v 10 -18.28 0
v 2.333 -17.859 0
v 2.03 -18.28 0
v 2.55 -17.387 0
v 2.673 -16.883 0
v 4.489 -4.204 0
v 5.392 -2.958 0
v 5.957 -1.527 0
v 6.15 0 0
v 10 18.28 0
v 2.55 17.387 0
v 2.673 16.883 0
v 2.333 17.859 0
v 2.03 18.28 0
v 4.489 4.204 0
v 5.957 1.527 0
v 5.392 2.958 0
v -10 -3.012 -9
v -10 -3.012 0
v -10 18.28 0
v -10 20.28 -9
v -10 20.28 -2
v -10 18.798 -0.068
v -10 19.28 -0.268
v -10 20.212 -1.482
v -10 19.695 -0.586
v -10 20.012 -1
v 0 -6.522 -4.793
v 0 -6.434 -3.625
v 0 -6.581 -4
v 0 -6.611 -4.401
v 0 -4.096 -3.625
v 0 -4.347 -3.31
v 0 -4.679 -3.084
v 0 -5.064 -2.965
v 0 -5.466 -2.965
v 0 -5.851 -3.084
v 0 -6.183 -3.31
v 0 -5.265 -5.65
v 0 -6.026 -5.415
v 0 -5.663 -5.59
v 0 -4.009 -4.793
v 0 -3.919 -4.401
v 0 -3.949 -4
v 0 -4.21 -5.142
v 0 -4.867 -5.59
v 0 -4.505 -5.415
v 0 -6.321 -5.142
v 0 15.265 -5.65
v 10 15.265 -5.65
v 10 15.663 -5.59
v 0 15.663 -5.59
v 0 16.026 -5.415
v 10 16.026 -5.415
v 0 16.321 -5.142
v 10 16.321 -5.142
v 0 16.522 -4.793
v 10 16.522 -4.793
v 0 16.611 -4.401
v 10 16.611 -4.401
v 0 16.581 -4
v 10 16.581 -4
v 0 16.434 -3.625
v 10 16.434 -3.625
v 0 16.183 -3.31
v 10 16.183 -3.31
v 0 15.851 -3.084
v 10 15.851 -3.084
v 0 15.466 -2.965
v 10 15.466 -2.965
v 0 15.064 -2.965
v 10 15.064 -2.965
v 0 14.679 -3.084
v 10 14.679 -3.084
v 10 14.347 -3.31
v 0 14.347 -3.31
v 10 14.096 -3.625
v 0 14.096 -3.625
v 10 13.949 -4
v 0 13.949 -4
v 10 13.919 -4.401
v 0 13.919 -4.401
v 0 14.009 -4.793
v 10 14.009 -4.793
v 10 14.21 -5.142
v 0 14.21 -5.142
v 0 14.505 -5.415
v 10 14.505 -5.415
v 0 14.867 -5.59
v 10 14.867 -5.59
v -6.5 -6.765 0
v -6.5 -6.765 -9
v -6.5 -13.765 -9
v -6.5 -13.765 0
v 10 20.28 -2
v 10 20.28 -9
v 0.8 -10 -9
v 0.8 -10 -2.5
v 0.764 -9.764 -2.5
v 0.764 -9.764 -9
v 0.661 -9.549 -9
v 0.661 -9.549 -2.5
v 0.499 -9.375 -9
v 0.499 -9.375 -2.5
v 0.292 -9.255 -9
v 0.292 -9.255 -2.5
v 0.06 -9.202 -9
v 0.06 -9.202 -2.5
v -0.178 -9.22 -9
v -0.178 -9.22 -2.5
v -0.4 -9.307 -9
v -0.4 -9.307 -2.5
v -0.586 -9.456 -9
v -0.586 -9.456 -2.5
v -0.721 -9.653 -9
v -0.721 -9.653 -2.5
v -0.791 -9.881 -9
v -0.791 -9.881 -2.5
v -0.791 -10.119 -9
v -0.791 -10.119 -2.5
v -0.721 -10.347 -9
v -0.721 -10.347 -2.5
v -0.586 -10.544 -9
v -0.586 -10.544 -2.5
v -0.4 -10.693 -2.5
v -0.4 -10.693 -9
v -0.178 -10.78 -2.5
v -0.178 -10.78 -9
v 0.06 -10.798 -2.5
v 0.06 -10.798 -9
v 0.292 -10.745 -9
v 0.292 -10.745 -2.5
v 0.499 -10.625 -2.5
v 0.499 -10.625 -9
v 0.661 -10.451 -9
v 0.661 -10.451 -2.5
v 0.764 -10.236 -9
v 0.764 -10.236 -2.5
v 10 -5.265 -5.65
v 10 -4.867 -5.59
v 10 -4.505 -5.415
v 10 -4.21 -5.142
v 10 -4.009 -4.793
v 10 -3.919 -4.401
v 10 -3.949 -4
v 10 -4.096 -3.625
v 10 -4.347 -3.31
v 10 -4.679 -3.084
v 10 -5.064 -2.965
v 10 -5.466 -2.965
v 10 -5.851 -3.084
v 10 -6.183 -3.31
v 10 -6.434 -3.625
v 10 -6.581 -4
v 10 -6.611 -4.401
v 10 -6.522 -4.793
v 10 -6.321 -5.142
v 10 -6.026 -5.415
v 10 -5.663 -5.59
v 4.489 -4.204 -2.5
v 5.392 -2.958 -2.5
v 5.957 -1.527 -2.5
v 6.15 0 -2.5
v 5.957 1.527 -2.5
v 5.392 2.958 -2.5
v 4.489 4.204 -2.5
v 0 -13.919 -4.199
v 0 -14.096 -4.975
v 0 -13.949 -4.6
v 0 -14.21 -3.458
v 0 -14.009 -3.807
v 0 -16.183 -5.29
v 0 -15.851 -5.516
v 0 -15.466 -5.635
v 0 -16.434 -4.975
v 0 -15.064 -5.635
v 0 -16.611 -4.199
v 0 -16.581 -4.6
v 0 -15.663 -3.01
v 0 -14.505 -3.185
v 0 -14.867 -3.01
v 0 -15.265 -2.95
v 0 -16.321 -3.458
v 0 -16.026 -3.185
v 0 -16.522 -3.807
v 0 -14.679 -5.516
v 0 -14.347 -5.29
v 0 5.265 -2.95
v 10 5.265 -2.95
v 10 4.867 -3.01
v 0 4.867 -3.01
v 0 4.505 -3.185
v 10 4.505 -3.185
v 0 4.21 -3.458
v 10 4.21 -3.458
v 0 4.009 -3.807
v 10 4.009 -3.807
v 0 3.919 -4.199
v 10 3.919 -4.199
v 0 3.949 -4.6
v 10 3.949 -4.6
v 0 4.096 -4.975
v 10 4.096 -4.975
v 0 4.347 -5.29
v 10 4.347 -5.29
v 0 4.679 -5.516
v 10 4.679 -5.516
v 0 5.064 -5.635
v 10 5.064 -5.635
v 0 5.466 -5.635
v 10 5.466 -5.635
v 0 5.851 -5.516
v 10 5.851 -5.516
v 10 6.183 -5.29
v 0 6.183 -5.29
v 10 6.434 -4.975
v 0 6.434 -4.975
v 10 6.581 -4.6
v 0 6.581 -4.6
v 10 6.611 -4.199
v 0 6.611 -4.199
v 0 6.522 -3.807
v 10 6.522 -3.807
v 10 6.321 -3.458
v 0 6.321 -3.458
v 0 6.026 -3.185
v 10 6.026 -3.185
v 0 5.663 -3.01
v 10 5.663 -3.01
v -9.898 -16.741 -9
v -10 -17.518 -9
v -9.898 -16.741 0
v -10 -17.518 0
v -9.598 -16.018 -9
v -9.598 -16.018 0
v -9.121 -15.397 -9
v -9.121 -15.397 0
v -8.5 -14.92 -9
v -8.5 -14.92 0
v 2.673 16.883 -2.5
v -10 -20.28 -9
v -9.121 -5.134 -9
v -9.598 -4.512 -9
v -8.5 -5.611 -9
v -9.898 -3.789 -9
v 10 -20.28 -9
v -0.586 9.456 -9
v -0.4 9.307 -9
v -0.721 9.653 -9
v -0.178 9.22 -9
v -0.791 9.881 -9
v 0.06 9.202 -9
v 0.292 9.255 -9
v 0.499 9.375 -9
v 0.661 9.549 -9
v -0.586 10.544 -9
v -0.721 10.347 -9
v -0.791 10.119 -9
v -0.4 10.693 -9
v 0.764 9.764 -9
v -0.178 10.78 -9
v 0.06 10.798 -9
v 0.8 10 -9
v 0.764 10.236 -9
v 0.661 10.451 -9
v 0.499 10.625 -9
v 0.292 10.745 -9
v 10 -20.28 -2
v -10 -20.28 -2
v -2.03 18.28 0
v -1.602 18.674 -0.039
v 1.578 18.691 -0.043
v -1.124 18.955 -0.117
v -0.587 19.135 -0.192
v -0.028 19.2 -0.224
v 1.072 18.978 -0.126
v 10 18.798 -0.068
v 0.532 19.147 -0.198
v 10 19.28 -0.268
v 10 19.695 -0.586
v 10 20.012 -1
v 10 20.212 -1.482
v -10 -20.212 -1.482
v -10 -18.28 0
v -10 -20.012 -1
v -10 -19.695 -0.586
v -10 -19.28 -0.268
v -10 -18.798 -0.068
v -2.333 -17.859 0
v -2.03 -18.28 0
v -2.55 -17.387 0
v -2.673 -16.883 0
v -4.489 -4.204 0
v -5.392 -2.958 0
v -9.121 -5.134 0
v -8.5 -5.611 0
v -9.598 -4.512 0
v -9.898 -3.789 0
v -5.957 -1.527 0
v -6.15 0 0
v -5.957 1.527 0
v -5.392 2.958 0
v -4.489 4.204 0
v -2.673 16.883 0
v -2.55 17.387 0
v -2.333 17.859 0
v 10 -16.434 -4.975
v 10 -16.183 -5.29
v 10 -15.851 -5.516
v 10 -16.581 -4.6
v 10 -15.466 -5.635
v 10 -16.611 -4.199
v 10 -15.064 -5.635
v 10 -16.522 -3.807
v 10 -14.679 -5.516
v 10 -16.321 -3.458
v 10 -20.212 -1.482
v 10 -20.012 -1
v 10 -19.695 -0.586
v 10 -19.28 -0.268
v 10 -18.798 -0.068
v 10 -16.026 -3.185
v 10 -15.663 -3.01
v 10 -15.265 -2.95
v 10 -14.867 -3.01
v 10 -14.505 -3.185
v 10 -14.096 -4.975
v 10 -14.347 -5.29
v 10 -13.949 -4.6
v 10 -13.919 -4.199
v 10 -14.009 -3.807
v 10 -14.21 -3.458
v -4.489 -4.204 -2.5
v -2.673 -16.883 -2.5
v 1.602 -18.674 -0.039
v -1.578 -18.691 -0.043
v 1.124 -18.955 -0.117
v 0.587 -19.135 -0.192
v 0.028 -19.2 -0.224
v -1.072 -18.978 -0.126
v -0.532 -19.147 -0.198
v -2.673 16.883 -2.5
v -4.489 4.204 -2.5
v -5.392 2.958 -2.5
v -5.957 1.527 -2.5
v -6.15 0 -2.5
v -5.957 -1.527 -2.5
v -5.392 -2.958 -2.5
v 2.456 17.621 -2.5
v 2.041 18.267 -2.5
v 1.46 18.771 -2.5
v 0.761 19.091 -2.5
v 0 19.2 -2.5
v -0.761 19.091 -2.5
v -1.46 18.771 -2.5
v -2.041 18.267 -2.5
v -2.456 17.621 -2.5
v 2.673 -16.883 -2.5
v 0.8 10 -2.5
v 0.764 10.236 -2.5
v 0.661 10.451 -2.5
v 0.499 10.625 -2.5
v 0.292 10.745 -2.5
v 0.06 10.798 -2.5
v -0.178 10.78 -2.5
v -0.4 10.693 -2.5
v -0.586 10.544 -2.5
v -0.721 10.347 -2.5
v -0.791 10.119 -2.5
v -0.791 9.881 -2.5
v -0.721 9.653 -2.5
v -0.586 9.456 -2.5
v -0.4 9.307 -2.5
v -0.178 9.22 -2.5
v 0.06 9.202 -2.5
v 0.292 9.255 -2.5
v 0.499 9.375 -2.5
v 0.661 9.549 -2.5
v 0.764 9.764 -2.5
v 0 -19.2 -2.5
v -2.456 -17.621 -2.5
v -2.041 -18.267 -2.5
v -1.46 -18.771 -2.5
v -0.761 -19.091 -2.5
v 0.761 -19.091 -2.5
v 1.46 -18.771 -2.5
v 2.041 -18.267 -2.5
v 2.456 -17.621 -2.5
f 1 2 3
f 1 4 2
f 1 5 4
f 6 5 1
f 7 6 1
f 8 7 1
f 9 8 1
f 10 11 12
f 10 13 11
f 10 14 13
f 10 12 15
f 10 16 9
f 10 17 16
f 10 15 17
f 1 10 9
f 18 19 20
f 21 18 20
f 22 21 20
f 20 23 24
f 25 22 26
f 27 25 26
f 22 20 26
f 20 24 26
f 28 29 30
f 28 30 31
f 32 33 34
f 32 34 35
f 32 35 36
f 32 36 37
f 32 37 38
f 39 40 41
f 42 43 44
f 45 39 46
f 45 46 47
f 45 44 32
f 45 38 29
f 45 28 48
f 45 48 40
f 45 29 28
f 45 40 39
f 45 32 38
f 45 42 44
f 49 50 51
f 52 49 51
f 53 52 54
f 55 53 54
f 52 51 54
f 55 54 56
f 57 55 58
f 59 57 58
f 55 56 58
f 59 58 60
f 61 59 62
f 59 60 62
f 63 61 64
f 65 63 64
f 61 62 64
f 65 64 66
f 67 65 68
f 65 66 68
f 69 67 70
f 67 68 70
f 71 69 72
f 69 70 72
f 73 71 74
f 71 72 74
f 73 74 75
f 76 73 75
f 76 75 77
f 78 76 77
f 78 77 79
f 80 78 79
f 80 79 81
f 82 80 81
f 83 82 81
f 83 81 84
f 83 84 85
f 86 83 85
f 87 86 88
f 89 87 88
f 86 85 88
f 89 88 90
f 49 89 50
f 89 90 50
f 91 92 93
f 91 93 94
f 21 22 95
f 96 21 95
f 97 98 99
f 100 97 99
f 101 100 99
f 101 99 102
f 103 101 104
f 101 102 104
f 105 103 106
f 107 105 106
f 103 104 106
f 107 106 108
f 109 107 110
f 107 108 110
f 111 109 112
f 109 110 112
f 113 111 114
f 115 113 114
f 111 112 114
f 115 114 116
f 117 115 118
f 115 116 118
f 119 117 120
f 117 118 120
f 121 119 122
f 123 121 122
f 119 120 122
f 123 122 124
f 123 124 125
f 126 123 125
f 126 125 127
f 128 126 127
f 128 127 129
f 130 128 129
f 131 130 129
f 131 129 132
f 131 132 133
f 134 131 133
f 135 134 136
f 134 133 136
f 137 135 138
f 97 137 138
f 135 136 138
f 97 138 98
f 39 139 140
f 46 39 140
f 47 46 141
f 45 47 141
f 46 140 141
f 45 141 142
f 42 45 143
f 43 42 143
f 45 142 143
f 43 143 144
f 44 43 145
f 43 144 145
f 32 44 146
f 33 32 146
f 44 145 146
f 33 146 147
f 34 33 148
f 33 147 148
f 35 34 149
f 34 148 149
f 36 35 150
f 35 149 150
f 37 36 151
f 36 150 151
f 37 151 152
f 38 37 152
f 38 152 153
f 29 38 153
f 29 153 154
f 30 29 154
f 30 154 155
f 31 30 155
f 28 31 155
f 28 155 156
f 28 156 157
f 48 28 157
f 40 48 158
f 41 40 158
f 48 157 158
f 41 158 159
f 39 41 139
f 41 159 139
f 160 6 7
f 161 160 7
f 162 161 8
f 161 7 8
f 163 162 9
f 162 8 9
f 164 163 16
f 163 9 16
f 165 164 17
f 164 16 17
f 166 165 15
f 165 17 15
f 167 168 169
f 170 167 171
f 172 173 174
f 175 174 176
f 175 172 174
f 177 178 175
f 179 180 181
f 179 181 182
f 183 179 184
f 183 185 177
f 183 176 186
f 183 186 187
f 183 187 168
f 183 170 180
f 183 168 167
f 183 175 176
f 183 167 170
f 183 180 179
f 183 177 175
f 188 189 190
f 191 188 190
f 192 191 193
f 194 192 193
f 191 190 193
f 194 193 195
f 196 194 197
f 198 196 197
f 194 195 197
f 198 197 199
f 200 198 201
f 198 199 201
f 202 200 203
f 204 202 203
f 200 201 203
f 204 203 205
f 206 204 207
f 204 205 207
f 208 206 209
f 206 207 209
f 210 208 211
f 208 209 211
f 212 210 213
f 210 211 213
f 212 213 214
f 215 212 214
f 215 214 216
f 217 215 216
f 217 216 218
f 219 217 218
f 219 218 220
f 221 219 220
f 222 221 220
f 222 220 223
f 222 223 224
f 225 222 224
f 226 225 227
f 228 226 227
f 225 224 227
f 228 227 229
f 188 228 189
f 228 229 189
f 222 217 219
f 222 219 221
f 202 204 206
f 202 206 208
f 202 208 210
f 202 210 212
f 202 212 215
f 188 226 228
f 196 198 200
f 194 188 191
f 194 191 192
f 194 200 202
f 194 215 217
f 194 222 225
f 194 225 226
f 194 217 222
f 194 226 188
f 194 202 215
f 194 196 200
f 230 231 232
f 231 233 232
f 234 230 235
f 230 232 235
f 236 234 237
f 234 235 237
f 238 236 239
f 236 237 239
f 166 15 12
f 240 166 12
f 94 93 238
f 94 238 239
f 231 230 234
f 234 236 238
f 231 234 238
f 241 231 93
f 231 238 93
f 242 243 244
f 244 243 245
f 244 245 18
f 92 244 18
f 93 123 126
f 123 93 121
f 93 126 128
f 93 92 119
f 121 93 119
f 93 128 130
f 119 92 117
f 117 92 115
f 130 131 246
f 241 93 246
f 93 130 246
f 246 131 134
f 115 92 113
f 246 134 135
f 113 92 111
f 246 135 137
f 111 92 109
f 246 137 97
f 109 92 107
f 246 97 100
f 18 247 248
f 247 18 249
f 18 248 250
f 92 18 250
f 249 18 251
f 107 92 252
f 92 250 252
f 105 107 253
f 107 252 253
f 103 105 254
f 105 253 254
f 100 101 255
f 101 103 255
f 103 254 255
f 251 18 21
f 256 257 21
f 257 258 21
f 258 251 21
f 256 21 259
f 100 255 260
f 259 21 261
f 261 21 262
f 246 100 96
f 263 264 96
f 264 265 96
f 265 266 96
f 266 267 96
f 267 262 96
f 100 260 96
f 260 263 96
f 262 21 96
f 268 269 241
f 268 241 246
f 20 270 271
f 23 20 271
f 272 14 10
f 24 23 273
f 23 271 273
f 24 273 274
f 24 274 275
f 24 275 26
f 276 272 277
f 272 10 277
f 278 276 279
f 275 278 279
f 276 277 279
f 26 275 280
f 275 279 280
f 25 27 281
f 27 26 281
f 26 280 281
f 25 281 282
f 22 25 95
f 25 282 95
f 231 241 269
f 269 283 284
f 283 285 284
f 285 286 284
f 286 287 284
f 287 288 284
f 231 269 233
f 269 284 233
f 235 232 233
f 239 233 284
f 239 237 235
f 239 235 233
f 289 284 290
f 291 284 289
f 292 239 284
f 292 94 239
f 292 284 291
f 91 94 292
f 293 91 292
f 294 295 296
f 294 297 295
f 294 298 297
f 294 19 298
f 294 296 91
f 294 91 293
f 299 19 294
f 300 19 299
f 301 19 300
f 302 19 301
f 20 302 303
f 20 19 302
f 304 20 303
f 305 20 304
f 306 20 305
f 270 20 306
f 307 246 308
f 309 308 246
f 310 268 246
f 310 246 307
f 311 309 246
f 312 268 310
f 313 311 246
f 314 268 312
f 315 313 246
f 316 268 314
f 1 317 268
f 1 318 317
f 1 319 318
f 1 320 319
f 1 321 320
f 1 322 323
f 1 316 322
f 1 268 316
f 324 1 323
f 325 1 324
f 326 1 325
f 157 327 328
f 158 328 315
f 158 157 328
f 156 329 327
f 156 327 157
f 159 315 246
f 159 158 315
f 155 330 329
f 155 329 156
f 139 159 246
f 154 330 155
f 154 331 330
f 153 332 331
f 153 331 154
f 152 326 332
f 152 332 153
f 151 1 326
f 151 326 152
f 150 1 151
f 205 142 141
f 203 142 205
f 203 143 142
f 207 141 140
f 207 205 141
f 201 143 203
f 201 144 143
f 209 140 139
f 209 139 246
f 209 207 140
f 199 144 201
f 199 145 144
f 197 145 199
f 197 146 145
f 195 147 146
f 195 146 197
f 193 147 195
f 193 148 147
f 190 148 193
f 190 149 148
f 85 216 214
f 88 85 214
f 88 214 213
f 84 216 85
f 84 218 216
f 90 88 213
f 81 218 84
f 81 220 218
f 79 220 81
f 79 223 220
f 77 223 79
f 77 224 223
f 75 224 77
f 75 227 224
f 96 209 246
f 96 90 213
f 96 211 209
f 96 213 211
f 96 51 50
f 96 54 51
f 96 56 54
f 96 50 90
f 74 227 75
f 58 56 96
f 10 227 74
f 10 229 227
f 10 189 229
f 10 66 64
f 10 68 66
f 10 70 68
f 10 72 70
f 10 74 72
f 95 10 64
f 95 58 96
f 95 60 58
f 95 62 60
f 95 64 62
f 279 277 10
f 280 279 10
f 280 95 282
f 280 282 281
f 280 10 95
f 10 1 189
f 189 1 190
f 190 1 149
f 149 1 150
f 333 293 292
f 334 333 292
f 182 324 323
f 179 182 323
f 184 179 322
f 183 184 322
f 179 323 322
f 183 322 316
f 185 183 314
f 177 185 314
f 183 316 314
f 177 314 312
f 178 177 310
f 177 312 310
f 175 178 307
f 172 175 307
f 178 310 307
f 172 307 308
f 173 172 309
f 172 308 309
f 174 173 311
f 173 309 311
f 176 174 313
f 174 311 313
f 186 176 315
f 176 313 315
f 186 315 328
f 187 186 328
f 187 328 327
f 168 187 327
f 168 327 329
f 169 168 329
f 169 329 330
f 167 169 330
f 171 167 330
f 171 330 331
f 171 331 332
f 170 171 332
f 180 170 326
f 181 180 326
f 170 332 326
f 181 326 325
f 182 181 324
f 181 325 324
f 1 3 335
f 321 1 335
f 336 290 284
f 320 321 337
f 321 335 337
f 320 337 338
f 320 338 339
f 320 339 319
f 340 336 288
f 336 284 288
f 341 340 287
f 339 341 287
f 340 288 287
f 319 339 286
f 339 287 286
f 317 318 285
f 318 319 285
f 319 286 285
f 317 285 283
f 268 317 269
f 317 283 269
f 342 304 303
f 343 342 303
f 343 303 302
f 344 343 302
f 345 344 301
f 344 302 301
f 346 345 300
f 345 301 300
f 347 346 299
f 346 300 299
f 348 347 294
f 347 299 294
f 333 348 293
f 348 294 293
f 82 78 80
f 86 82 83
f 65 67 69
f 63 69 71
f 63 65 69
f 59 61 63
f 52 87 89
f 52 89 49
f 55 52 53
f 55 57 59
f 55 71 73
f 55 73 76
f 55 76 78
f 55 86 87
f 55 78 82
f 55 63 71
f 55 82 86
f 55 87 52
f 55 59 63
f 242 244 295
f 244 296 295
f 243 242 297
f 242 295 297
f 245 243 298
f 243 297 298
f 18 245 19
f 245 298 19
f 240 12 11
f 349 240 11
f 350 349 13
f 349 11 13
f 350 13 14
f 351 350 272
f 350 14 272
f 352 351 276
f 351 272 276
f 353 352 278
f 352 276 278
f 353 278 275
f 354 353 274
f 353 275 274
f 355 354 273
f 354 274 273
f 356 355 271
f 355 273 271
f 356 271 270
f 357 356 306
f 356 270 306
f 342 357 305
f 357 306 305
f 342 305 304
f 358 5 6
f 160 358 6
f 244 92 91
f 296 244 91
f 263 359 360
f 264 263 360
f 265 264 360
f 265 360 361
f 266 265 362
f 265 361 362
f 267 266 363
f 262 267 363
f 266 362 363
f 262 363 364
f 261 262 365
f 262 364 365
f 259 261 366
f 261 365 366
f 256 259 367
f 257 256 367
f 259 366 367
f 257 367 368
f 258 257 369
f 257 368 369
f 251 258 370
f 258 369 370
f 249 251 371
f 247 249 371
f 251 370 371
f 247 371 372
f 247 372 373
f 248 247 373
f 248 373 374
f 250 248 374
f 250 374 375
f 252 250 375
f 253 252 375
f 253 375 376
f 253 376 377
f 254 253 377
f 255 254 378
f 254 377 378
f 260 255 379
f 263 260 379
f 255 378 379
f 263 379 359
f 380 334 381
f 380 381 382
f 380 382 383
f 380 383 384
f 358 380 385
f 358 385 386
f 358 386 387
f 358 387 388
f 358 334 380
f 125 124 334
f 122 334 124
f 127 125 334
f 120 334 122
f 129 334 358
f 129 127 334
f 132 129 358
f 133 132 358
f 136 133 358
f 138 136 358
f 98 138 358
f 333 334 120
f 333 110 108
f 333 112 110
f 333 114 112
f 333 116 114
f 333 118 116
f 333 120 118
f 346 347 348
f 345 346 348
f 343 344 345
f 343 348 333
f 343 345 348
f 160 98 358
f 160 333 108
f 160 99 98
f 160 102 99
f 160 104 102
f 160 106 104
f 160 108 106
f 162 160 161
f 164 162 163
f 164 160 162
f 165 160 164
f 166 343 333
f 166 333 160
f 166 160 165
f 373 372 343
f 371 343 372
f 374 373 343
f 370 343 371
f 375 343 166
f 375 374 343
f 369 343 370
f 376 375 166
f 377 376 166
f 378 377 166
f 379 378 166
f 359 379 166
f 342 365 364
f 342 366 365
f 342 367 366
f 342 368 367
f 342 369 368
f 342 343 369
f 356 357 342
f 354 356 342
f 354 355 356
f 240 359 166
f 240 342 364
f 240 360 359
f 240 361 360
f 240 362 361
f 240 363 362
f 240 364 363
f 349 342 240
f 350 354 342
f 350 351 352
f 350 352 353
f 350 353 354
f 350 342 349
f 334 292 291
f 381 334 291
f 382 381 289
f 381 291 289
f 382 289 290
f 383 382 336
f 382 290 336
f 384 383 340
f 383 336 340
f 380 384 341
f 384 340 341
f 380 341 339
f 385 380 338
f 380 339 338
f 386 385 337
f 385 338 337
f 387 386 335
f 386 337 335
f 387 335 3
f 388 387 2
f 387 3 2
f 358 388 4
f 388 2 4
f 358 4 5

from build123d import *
from OCP.BRepFilletAPI import BRepFilletAPI_MakeChamfer

# Parameters (mm, degrees)
SKETCH1_W           = 20
SKETCH1_H           = 40.56076
BOSS_EXTRUDE1_DEPTH = 9
SKETCH6_R           = 1.35
CUT_EXTRUDE1_DEPTH  = 10
CUT_EXTRUDE2_DEPTH  = 2.5
FILLET1_R           = 2
SKETCH9_R           = 0.8
CUT_EXTRUDE3_DEPTH  = 6.5
SKETCH10_W          = 9
SKETCH10_H          = 7
CUT_EXTRUDE4_DEPTH  = 3.5
CHAMFER1_SIZE       = 2.020725942
CHAMFER1_SIZE_2     = 3.5
FILLET2_R           = 3


# Some blends are built 0.0001 mm under size
with BuildPart() as part:
    # Sketch1 → Boss-Extrude1 (new body)
    with BuildSketch(Plane.XY):
        Rectangle(SKETCH1_W, SKETCH1_H)
    extrude(amount=-BOSS_EXTRUDE1_DEPTH)

    # Sketch6 → Cut-Extrude1 (cut)
    with BuildSketch(Plane(origin=(10, 0, 0), x_dir=(0, 0, -1), z_dir=(1, 0, 0))):
        with Locations(Location((4.3, -15.26519, 0), (0, 0, 180))):
            Circle(SKETCH6_R)
        with Locations((4.3, -5.26519)):
            Circle(SKETCH6_R)
        with Locations((4.3, 15.26519)):
            Circle(SKETCH6_R)
        with Locations(Location((4.3, 5.26519, 0), (0, 0, 180))):
            Circle(SKETCH6_R)
    extrude(amount=-CUT_EXTRUDE1_DEPTH, mode=Mode.SUBTRACT)

    # Sketch8 → Cut-Extrude2 (cut)
    with BuildSketch(Plane.XY):
        with BuildLine():
            Line((-4.488964362, -4.203771991), (-2.672717394, -16.882859941))
            ThreePointArc((-2.672717394, -16.882859941), (0, -19.2), (2.672717394, -16.882859941))
            Line((2.672717394, -16.882859941), (4.488964362, -4.203771991))
            ThreePointArc((4.488964362, -4.203771991), (6.15, 0), (4.488964362, 4.203771991))
            Line((4.488964362, 4.203771991), (2.672717394, 16.882859941))
            ThreePointArc((2.672717394, 16.882859941), (0, 19.2), (-2.672717394, 16.882859941))
            Line((-2.672717394, 16.882859941), (-4.488964362, 4.203771991))
            ThreePointArc((-4.488964362, 4.203771991), (-6.15, 0), (-4.488964362, -4.203771991))
        make_face()
    extrude(amount=-CUT_EXTRUDE2_DEPTH, mode=Mode.SUBTRACT)

    # Fillet1
    # the kernel refuses this fillet: 2 mm, written as the material it takes off along each edge
    with BuildSketch(Plane(origin=(-15, -20.28038, 0), x_dir=(0, 0, -1), z_dir=(1, 0, 0)), Plane(origin=(15, 20.28038, 0), x_dir=(0, 0, -1), z_dir=(-1, 0, 0))) as fillet1_piece_1:
        with BuildLine():
            CenterArc((FILLET1_R, FILLET1_R), FILLET1_R, 180, 90)
            Line((0, FILLET1_R), (0, 0))
            Line((0, 0), (FILLET1_R, 0))
        make_face()
    extrude(amount=30, mode=Mode.SUBTRACT)

    # Sketch9 → Cut-Extrude3 (cut)
    with BuildSketch(Plane.XY.offset(-2.5)):
        with Locations((0, 10)):
            Circle(SKETCH9_R)
        with Locations((0, -10)):
            Circle(SKETCH9_R)
    extrude(amount=-CUT_EXTRUDE3_DEPTH, mode=Mode.SUBTRACT)

    # Sketch10 → Cut-Extrude4 (cut)
    with BuildSketch(Plane.ZY.offset(10)):
        with Locations((-4.5, -10.26517)):
            Rectangle(SKETCH10_W, SKETCH10_H)
    extrude(amount=-CUT_EXTRUDE4_DEPTH, mode=Mode.SUBTRACT)

    # Chamfer1
    chamfer1_edges_1 = [part.edges().sort_by_distance(p)[0] for p in [
        (-10, -6.76517, -4.5),
    ]]
    chamfer1_side_1 = [part.faces().sort_by_distance(p)[0] for p in [
        (-10, -6.724755481, -4.5),
    ]]
    chamfer1_edges_2 = [part.edges().sort_by_distance(p)[0] for p in [
        (-10, -13.76517, -4.5),
    ]]
    chamfer1_side_2 = [part.faces().sort_by_distance(p)[0] for p in [
        (-10, -13.805584519, -4.5),
    ]]
    chamfer1 = BRepFilletAPI_MakeChamfer(part.part.solid().wrapped)
    for e in chamfer1_edges_1:
        chamfer1.Add(CHAMFER1_SIZE - 0.0001, CHAMFER1_SIZE_2 - 0.0001, e.wrapped, chamfer1_side_1[0].wrapped)
    for e in chamfer1_edges_2:
        chamfer1.Add(CHAMFER1_SIZE - 0.0001, CHAMFER1_SIZE_2 - 0.0001, e.wrapped, chamfer1_side_2[0].wrapped)
    add(Compound.cast(chamfer1.Shape()), mode=Mode.REPLACE)  # a hair under: the kernel refuses the full size

    # Fillet2
    fillet2_edges = [part.edges().sort_by_distance(p)[0] for p in [
        (-10, -4.744544058, -4.5),
        (-10, -15.785795942, -4.5),
    ]]
    fillet(fillet2_edges, radius=FILLET2_R)


solid = part.part
